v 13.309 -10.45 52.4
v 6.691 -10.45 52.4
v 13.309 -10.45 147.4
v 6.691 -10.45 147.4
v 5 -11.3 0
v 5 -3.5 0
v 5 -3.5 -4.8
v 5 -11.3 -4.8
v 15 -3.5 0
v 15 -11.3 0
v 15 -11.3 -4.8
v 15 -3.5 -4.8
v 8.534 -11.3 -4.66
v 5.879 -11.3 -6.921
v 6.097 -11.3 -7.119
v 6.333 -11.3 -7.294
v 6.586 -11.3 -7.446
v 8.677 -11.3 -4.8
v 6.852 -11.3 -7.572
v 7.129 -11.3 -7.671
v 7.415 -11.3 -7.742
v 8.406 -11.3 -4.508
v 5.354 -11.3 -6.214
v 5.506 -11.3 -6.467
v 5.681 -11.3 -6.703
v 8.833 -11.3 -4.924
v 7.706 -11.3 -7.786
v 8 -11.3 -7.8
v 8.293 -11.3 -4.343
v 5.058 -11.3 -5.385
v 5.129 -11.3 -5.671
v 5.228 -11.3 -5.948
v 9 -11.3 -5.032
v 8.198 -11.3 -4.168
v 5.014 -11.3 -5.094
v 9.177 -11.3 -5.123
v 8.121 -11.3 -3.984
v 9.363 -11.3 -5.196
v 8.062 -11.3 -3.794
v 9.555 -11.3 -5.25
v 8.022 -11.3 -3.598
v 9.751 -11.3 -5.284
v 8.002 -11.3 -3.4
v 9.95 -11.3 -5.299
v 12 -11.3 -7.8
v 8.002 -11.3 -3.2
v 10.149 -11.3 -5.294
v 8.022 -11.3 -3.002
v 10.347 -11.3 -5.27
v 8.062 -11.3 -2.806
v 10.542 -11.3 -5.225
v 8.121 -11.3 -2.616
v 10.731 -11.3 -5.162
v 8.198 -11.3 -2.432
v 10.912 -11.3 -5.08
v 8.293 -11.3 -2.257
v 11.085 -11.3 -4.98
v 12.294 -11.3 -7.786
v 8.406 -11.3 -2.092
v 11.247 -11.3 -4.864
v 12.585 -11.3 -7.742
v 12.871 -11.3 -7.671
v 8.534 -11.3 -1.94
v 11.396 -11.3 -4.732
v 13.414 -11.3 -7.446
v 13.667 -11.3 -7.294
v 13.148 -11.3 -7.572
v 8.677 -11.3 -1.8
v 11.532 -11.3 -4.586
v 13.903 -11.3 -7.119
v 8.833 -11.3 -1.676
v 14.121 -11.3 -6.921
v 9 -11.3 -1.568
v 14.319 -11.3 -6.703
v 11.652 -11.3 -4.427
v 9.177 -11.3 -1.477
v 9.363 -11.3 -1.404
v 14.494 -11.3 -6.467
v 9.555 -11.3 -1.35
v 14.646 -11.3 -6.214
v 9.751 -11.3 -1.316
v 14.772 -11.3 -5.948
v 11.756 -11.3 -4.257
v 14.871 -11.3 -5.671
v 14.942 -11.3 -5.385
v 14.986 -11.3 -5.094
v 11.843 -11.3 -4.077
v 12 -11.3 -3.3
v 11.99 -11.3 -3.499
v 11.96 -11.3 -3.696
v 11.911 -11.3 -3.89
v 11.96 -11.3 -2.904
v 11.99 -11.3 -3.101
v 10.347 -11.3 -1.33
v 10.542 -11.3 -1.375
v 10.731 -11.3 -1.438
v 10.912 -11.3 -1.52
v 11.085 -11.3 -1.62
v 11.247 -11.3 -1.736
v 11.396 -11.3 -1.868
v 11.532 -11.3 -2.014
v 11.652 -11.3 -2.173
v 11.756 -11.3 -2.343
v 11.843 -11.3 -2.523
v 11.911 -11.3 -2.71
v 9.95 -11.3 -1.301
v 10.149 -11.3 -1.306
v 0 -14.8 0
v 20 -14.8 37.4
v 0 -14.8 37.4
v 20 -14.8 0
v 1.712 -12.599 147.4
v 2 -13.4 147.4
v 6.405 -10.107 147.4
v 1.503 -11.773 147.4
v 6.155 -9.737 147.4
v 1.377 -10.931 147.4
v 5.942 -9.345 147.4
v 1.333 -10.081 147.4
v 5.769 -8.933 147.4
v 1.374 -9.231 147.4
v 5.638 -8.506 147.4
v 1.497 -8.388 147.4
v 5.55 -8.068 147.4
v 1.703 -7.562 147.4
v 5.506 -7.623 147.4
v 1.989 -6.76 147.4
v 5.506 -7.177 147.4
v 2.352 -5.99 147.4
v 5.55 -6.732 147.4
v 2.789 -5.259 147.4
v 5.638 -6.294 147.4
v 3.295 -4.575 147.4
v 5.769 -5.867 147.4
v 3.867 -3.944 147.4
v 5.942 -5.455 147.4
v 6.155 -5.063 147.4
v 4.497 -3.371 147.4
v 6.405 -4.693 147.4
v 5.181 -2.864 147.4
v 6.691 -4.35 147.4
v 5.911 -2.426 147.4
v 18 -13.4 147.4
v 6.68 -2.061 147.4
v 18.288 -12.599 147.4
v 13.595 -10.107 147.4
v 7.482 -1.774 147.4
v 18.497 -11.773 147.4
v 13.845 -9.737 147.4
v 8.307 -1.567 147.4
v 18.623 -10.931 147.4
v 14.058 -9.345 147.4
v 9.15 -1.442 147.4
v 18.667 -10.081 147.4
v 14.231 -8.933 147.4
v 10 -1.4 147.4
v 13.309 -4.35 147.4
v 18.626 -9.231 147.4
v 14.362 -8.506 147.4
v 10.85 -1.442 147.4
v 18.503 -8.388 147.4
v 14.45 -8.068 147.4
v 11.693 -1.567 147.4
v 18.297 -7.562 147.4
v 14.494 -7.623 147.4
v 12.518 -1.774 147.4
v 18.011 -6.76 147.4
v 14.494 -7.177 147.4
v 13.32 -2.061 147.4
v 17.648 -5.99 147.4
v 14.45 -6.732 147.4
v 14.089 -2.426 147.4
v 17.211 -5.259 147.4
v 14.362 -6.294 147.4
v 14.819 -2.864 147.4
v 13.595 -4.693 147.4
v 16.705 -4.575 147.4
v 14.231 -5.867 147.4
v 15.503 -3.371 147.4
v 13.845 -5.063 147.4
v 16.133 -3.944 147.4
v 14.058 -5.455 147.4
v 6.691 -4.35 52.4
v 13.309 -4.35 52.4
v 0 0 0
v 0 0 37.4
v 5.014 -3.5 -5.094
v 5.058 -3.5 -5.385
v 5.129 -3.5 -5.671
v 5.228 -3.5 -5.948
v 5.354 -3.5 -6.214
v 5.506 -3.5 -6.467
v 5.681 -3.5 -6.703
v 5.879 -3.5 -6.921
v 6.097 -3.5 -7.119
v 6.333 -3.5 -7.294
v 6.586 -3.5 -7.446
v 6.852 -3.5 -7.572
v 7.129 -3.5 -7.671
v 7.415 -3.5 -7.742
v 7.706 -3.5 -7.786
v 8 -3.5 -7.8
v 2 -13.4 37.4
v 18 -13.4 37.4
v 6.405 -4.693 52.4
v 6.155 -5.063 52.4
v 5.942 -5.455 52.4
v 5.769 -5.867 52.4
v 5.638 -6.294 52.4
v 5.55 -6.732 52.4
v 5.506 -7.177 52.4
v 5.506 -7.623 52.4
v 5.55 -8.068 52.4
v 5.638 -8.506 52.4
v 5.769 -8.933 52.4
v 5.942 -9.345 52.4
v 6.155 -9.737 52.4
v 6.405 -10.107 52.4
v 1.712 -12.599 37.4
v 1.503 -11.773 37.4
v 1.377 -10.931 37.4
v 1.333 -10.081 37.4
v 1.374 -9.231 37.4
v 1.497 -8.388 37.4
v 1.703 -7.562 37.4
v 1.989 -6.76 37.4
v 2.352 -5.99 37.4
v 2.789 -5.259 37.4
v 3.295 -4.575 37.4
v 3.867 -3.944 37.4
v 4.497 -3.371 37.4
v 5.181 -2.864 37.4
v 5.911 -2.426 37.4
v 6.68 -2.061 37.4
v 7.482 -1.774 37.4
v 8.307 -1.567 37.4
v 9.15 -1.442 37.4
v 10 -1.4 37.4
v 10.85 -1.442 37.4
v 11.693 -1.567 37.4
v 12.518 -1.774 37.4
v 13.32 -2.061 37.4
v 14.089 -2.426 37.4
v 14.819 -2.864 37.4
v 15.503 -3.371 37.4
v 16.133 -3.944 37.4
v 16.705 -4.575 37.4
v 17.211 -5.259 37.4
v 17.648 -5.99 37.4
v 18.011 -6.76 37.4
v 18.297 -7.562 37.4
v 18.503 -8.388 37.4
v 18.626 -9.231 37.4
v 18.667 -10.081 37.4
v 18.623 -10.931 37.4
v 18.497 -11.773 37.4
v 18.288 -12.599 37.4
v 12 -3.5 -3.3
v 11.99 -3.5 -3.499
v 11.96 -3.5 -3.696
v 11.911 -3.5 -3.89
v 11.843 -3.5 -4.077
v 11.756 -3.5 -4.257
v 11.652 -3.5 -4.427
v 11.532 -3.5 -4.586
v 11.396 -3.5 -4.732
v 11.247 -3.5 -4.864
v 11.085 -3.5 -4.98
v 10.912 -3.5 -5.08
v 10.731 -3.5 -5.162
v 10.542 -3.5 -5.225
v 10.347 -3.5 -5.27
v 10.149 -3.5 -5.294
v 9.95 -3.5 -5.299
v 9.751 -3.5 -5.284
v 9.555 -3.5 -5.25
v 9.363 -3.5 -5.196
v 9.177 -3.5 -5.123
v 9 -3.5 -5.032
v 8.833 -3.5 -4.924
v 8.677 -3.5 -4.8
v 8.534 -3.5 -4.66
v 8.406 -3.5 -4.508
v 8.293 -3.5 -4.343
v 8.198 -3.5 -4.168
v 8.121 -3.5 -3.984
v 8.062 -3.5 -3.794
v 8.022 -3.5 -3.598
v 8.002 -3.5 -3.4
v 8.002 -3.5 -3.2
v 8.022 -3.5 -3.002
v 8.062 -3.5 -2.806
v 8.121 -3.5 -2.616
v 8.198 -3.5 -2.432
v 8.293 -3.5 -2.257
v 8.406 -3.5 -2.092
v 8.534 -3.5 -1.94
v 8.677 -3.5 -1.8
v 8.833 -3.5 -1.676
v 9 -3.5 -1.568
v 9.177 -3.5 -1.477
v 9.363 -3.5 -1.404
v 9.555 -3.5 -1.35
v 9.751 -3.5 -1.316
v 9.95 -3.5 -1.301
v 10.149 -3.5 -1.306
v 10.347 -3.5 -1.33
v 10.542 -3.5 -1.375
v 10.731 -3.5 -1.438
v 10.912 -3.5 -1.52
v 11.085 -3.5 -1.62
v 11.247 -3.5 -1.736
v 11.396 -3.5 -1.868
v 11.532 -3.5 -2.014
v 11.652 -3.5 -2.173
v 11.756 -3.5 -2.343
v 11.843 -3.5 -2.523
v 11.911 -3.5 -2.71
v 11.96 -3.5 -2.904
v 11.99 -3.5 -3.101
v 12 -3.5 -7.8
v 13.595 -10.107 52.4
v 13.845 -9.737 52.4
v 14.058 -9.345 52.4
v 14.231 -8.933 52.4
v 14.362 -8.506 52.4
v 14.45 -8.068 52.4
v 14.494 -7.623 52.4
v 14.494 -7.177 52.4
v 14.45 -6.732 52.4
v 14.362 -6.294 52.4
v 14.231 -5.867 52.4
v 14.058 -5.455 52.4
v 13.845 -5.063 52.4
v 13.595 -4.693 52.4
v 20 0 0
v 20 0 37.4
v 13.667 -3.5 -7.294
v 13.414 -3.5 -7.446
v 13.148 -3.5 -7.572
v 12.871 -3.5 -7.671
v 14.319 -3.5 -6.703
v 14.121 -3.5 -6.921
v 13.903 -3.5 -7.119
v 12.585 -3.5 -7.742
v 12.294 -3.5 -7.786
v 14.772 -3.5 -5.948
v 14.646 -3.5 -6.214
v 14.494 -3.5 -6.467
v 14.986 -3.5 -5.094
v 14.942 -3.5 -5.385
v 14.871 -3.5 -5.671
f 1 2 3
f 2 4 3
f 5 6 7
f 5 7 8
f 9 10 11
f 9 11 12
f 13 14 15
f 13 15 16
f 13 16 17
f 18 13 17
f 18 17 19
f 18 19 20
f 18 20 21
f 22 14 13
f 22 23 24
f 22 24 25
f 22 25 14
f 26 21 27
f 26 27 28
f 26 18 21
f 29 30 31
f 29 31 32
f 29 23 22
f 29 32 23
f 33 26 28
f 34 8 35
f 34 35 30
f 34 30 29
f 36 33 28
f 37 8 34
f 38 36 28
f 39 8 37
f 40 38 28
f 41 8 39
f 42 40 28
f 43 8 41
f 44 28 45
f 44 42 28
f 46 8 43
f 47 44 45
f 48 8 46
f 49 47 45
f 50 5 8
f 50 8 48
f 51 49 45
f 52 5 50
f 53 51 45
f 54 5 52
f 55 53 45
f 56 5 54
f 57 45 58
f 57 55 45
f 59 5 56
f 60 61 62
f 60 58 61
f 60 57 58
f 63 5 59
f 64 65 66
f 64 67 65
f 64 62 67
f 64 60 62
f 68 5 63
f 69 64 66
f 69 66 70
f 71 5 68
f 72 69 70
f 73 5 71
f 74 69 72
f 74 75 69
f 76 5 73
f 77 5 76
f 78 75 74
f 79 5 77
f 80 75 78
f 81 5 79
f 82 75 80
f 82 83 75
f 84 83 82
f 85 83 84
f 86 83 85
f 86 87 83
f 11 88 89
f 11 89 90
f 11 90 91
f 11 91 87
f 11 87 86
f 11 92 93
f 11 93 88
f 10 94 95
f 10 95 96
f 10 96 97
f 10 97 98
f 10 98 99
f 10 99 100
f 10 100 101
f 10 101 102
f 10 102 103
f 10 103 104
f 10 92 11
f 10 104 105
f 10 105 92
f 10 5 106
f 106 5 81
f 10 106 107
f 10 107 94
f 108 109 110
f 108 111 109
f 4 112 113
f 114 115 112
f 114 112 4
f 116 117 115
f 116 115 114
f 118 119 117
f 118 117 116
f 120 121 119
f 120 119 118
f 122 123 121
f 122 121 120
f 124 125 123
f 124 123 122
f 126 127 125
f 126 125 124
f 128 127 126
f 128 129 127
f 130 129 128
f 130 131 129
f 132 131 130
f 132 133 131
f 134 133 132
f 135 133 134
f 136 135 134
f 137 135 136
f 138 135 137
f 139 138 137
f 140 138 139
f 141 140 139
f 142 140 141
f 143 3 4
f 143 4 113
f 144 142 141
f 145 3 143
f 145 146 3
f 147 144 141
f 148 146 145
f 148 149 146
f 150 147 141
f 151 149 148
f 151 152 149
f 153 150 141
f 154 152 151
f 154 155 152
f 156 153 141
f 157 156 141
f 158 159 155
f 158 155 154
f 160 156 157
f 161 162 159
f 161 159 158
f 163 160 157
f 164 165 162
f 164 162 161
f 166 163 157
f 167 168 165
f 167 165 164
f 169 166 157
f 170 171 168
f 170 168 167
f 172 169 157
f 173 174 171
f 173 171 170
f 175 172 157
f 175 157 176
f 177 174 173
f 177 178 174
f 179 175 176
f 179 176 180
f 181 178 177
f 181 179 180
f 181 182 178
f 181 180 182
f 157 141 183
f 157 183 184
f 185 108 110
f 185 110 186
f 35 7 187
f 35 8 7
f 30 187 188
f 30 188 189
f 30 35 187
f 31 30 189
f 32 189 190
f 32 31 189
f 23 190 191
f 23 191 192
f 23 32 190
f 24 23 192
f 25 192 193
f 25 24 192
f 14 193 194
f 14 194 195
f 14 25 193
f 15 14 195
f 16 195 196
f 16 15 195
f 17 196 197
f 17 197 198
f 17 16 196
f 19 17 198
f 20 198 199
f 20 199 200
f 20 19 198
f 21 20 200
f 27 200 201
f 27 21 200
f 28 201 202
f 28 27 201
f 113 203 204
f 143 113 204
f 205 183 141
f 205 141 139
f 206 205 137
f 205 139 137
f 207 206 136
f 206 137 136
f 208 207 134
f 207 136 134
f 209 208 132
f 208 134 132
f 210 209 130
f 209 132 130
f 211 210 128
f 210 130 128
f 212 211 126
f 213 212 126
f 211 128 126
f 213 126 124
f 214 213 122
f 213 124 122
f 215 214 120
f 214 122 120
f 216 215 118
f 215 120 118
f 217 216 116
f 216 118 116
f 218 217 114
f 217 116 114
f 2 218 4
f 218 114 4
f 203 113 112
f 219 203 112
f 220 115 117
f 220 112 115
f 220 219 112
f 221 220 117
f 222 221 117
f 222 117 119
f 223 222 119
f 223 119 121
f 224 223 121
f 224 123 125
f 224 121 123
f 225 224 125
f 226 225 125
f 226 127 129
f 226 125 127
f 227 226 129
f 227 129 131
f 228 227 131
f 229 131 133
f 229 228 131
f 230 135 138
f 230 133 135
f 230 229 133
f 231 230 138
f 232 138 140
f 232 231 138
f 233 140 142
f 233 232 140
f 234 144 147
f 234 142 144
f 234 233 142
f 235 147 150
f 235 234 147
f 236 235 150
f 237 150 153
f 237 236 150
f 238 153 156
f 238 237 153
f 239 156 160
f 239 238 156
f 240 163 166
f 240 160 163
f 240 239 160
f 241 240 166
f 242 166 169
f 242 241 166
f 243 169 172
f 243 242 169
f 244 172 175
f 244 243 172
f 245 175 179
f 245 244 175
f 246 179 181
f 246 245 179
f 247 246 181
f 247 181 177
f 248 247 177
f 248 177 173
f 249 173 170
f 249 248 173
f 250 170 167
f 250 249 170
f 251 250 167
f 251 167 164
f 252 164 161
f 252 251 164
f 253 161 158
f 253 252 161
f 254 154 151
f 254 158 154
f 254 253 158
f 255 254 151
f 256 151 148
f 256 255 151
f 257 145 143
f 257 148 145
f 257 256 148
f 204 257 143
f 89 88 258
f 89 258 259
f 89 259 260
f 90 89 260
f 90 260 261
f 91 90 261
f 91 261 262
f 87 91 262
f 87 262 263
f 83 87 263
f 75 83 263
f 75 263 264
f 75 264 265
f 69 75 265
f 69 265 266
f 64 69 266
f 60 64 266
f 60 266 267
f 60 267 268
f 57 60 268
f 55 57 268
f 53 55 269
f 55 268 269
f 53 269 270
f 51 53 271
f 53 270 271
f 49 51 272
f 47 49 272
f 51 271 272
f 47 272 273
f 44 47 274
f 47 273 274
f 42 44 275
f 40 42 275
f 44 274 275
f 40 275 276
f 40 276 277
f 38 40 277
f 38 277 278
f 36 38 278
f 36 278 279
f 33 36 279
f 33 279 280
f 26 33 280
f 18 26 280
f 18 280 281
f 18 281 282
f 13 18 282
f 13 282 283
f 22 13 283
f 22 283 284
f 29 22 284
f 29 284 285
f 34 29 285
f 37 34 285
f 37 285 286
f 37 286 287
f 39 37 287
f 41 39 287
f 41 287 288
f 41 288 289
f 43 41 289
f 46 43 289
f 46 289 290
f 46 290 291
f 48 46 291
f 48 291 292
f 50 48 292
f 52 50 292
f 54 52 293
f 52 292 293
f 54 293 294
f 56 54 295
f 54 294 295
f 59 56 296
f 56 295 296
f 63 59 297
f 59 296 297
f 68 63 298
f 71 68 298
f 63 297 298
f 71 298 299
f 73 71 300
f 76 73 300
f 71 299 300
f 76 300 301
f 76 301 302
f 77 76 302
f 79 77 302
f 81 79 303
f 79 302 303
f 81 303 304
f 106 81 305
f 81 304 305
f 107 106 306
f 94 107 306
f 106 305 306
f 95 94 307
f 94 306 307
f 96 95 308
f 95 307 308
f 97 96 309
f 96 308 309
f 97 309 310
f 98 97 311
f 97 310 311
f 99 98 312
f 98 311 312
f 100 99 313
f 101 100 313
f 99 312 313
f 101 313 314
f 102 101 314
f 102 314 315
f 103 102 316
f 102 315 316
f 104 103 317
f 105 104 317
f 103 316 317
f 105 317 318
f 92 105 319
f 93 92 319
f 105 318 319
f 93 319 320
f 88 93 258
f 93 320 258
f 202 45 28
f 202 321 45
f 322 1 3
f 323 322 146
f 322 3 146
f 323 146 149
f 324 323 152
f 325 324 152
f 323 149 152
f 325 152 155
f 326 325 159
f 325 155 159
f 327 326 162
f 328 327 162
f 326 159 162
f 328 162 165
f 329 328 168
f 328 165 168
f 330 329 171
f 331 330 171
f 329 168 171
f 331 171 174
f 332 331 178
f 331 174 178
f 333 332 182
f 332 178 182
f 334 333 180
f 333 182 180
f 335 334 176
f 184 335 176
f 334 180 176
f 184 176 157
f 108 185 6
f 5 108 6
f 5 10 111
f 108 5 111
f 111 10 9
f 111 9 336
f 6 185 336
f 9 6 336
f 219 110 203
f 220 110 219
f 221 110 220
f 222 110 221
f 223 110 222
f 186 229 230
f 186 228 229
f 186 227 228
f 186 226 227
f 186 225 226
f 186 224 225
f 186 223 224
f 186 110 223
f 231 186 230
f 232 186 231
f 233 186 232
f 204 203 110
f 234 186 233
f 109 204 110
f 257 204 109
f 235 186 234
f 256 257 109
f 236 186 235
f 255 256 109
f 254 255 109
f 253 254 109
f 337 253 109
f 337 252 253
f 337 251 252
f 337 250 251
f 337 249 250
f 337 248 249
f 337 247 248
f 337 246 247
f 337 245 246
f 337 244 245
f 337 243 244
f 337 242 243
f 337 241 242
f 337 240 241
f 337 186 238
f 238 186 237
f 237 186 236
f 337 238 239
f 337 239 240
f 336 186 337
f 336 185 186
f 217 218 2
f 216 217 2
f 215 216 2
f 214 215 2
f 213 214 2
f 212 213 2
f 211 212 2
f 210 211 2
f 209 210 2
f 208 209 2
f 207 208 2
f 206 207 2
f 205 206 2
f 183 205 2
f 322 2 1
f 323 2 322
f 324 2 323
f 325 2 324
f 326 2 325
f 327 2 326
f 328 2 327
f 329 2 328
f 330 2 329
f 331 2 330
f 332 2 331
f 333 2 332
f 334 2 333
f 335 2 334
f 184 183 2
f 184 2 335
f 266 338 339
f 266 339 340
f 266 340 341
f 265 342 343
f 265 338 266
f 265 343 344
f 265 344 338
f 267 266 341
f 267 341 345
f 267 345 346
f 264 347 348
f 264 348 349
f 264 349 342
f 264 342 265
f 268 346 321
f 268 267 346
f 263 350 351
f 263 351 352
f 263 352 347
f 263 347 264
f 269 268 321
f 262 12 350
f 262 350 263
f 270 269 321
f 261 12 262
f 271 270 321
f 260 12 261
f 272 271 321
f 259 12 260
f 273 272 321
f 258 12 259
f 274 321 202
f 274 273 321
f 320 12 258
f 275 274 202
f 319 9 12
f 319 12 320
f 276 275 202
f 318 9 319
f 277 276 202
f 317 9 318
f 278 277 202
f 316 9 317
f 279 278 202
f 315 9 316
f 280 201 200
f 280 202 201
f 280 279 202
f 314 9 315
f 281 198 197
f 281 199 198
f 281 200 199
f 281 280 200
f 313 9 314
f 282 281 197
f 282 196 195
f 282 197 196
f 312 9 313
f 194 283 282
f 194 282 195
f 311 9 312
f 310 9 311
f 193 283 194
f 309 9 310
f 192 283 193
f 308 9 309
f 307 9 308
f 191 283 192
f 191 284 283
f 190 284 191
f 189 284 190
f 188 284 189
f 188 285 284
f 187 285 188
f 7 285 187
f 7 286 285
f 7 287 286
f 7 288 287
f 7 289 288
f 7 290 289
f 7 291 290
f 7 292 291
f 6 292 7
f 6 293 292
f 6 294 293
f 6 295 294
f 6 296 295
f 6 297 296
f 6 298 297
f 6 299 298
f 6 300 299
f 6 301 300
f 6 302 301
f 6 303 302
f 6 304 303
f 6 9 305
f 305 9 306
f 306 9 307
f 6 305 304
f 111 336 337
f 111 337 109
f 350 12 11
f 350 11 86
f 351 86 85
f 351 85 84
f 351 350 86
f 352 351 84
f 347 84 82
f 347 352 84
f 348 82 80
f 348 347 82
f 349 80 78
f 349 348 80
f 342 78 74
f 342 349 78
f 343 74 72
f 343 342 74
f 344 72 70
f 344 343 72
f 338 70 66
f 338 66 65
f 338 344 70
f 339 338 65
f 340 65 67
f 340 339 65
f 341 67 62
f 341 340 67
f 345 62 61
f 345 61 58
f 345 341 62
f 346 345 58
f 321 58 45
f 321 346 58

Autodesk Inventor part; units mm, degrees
ref_plane "YZ Plane" through (0, 0, 0) normal (1, 0, 0) x (0, 1, 0)
ref_plane "XZ Plane" through (0, 0, 0) normal (0, 1, 0) x (-1, 0, 0)
ref_plane "XY Plane" through (0, 0, 0) normal (0, 0, 1) x (1, 0, 0)
sketch "Sketch1" plane through (0, 0, 0) normal (0, 0, 1) x (1, 0, 0)
  line L0 (0, 0) -> (20, 0)
  line L1 (20, 0) -> (20, -14.8)
  line L2 (20, -14.8) -> (0, -14.8)
  line L3 (0, -14.8) -> (0, 0)
  dimension "d0" = 20
  dimension "d1" = 14.8
extrude "Extrusion1" add sketch "Sketch1" along normal blind 37.4
sketch "Sketch2" plane through (0, 0, 37.4) normal (0, 0, 1) x (1, 0, 0)
  line L0 (0, 0) -> (0, -14.8) projected
  line L1 (20, 0) -> (0, 0) projected
  line L2 (2, -13.4) -> (18, -13.4)
  arc A0 (18, -13.4) -> (2, -13.4) centre (10, -10.0667) ccw
  point P0 (10, -7.4)
  point P1 (10, -13.4)
extrude "Extrusion2" add sketch "Sketch2" along normal blind 120
sketch "Sketch3" plane through (0, 0, 157.4) normal (0, 0, 1) x (1, 0, 0)
  arc A0 (18, -13.4) -> (2, -13.4) centre (10, -10.0667) ccw projected
  line L0 (2, -13.4) -> (18, -13.4) projected
  line L1 (2, -13.4) -> (2, -13.4)
  line L2 (2, -13.4) -> (2, -13.4) construction
  line L3 (10, -13.4) -> (22, -13.4) construction
  line L4 (18, -13.4) -> (2, -13.4) projected
  line L5 (0, -14.8) -> (20, -14.8) projected
  line L6 (6.6913, -4.35) -> (13.3087, -4.35)
  line L7 (6.6913, -10.45) -> (13.3087, -10.45)
  arc A1 (6.6913, -4.35) -> (6.6913, -10.45) centre (10, -7.4) ccw
  arc A2 (13.3087, -10.45) -> (13.3087, -4.35) centre (10, -7.4) ccw
  point P0 (0, 0)
  dimension "d12" = 90
extrude "Extrusion3" add sketch "Sketch3" along normal blind 9.3 contours L6 A2 L7 A1
sketch "Sketch4" plane through (6.6913, -4.35, 157.4) normal (0, 1, 0) x (1, 0, 0)
  circle A0 centre (3.3087, -4.5) radius 2
  line L0 (-5.358, 0) -> (11.9754, 0) projected
  point P0 (-6.6913, 157.4)
  point P1 (11.3087, 0)
  point P2 (-4.6913, 0)
  dimension "d21" = 4
  dimension "d22" = 4.5
extrude "Extrusion4" cut sketch "Sketch4" against normal through all
sketch "Sketch5" plane through (0, 0, 0) normal (0, 0, -1) x (-1, 0, 0)
  line L0 (-15, -3.5) -> (-5, -3.5)
  line L1 (-5, -3.5) -> (-5, -11.3)
  line L2 (-5, -11.3) -> (-15, -11.3)
  line L3 (-15, -11.3) -> (-15, -3.5)
  line L4 (-15, -3.5) -> (-5, -11.3) construction
  line L5 (-5, -3.5) -> (-15, -11.3) construction
  line L6 (-20, 0) -> (0, 0) projected
  line L7 (0, -14.8) -> (-20, -14.8) projected
  line L8 (0, 0) -> (0, -14.8) projected
  line L9 (-20, 0) -> (0, 0) projected
  line L10 (-20, -14.8) -> (-20, 0) projected
  point P0 (-10, -7.4)
  point P1 (0, -7.4)
  point P2 (-10, -7.4)
  dimension "d25" = 7.8
  dimension "d26" = 10
  dimension "d27" = 10
extrude "Extrusion5" add sketch "Sketch5" along normal blind 7.8 contours L0 L1 L2 L3
sketch "Sketch6" plane through (5, -3.5, 0) normal (0, 1, 0) x (1, 0, 0)
  circle A0 centre (5, 3.3) radius 2
  line L0 (0, 7.8) -> (10, 7.8) projected
  line L1 (0, 0) -> (0, 7.8) projected
  point P0 (-5, 0)
  point P1 (5, 7.8)
  dimension "d30" = 4
  dimension "d31" = 4.5
  dimension "d32" = 5
extrude "Extrusion6" cut sketch "Sketch6" against normal through all
fillet "Fillet1" radius 3 2 edges at (15, -7.4, -7.8) (5, -7.4, -7.8)
ref_plane "작업 평면1" through (0, 0, 157.4) normal (0, 0, 1) x (1, 0, 0)
extrude "돌출7" cut sketch "Sketch3" against normal blind 100 contours L6 A2 L7 A1
split "분할1" plane through (0, 0, 157.4) removes the side toward (0, 0, 1)
sketch "스케치7" plane through (0, 0, 166.7) normal (0, 0, 1) x (1, 0, 0)
  point P0 (0, 0)
move faces "이동2" translate (0, 0, -10) faces at (8.8971, -12.4167, 157.4)
move faces "이동7" translate (0, 0, -5) faces at (11.454, -8.4605, 57.4)
properties part number "Actuator Body"
